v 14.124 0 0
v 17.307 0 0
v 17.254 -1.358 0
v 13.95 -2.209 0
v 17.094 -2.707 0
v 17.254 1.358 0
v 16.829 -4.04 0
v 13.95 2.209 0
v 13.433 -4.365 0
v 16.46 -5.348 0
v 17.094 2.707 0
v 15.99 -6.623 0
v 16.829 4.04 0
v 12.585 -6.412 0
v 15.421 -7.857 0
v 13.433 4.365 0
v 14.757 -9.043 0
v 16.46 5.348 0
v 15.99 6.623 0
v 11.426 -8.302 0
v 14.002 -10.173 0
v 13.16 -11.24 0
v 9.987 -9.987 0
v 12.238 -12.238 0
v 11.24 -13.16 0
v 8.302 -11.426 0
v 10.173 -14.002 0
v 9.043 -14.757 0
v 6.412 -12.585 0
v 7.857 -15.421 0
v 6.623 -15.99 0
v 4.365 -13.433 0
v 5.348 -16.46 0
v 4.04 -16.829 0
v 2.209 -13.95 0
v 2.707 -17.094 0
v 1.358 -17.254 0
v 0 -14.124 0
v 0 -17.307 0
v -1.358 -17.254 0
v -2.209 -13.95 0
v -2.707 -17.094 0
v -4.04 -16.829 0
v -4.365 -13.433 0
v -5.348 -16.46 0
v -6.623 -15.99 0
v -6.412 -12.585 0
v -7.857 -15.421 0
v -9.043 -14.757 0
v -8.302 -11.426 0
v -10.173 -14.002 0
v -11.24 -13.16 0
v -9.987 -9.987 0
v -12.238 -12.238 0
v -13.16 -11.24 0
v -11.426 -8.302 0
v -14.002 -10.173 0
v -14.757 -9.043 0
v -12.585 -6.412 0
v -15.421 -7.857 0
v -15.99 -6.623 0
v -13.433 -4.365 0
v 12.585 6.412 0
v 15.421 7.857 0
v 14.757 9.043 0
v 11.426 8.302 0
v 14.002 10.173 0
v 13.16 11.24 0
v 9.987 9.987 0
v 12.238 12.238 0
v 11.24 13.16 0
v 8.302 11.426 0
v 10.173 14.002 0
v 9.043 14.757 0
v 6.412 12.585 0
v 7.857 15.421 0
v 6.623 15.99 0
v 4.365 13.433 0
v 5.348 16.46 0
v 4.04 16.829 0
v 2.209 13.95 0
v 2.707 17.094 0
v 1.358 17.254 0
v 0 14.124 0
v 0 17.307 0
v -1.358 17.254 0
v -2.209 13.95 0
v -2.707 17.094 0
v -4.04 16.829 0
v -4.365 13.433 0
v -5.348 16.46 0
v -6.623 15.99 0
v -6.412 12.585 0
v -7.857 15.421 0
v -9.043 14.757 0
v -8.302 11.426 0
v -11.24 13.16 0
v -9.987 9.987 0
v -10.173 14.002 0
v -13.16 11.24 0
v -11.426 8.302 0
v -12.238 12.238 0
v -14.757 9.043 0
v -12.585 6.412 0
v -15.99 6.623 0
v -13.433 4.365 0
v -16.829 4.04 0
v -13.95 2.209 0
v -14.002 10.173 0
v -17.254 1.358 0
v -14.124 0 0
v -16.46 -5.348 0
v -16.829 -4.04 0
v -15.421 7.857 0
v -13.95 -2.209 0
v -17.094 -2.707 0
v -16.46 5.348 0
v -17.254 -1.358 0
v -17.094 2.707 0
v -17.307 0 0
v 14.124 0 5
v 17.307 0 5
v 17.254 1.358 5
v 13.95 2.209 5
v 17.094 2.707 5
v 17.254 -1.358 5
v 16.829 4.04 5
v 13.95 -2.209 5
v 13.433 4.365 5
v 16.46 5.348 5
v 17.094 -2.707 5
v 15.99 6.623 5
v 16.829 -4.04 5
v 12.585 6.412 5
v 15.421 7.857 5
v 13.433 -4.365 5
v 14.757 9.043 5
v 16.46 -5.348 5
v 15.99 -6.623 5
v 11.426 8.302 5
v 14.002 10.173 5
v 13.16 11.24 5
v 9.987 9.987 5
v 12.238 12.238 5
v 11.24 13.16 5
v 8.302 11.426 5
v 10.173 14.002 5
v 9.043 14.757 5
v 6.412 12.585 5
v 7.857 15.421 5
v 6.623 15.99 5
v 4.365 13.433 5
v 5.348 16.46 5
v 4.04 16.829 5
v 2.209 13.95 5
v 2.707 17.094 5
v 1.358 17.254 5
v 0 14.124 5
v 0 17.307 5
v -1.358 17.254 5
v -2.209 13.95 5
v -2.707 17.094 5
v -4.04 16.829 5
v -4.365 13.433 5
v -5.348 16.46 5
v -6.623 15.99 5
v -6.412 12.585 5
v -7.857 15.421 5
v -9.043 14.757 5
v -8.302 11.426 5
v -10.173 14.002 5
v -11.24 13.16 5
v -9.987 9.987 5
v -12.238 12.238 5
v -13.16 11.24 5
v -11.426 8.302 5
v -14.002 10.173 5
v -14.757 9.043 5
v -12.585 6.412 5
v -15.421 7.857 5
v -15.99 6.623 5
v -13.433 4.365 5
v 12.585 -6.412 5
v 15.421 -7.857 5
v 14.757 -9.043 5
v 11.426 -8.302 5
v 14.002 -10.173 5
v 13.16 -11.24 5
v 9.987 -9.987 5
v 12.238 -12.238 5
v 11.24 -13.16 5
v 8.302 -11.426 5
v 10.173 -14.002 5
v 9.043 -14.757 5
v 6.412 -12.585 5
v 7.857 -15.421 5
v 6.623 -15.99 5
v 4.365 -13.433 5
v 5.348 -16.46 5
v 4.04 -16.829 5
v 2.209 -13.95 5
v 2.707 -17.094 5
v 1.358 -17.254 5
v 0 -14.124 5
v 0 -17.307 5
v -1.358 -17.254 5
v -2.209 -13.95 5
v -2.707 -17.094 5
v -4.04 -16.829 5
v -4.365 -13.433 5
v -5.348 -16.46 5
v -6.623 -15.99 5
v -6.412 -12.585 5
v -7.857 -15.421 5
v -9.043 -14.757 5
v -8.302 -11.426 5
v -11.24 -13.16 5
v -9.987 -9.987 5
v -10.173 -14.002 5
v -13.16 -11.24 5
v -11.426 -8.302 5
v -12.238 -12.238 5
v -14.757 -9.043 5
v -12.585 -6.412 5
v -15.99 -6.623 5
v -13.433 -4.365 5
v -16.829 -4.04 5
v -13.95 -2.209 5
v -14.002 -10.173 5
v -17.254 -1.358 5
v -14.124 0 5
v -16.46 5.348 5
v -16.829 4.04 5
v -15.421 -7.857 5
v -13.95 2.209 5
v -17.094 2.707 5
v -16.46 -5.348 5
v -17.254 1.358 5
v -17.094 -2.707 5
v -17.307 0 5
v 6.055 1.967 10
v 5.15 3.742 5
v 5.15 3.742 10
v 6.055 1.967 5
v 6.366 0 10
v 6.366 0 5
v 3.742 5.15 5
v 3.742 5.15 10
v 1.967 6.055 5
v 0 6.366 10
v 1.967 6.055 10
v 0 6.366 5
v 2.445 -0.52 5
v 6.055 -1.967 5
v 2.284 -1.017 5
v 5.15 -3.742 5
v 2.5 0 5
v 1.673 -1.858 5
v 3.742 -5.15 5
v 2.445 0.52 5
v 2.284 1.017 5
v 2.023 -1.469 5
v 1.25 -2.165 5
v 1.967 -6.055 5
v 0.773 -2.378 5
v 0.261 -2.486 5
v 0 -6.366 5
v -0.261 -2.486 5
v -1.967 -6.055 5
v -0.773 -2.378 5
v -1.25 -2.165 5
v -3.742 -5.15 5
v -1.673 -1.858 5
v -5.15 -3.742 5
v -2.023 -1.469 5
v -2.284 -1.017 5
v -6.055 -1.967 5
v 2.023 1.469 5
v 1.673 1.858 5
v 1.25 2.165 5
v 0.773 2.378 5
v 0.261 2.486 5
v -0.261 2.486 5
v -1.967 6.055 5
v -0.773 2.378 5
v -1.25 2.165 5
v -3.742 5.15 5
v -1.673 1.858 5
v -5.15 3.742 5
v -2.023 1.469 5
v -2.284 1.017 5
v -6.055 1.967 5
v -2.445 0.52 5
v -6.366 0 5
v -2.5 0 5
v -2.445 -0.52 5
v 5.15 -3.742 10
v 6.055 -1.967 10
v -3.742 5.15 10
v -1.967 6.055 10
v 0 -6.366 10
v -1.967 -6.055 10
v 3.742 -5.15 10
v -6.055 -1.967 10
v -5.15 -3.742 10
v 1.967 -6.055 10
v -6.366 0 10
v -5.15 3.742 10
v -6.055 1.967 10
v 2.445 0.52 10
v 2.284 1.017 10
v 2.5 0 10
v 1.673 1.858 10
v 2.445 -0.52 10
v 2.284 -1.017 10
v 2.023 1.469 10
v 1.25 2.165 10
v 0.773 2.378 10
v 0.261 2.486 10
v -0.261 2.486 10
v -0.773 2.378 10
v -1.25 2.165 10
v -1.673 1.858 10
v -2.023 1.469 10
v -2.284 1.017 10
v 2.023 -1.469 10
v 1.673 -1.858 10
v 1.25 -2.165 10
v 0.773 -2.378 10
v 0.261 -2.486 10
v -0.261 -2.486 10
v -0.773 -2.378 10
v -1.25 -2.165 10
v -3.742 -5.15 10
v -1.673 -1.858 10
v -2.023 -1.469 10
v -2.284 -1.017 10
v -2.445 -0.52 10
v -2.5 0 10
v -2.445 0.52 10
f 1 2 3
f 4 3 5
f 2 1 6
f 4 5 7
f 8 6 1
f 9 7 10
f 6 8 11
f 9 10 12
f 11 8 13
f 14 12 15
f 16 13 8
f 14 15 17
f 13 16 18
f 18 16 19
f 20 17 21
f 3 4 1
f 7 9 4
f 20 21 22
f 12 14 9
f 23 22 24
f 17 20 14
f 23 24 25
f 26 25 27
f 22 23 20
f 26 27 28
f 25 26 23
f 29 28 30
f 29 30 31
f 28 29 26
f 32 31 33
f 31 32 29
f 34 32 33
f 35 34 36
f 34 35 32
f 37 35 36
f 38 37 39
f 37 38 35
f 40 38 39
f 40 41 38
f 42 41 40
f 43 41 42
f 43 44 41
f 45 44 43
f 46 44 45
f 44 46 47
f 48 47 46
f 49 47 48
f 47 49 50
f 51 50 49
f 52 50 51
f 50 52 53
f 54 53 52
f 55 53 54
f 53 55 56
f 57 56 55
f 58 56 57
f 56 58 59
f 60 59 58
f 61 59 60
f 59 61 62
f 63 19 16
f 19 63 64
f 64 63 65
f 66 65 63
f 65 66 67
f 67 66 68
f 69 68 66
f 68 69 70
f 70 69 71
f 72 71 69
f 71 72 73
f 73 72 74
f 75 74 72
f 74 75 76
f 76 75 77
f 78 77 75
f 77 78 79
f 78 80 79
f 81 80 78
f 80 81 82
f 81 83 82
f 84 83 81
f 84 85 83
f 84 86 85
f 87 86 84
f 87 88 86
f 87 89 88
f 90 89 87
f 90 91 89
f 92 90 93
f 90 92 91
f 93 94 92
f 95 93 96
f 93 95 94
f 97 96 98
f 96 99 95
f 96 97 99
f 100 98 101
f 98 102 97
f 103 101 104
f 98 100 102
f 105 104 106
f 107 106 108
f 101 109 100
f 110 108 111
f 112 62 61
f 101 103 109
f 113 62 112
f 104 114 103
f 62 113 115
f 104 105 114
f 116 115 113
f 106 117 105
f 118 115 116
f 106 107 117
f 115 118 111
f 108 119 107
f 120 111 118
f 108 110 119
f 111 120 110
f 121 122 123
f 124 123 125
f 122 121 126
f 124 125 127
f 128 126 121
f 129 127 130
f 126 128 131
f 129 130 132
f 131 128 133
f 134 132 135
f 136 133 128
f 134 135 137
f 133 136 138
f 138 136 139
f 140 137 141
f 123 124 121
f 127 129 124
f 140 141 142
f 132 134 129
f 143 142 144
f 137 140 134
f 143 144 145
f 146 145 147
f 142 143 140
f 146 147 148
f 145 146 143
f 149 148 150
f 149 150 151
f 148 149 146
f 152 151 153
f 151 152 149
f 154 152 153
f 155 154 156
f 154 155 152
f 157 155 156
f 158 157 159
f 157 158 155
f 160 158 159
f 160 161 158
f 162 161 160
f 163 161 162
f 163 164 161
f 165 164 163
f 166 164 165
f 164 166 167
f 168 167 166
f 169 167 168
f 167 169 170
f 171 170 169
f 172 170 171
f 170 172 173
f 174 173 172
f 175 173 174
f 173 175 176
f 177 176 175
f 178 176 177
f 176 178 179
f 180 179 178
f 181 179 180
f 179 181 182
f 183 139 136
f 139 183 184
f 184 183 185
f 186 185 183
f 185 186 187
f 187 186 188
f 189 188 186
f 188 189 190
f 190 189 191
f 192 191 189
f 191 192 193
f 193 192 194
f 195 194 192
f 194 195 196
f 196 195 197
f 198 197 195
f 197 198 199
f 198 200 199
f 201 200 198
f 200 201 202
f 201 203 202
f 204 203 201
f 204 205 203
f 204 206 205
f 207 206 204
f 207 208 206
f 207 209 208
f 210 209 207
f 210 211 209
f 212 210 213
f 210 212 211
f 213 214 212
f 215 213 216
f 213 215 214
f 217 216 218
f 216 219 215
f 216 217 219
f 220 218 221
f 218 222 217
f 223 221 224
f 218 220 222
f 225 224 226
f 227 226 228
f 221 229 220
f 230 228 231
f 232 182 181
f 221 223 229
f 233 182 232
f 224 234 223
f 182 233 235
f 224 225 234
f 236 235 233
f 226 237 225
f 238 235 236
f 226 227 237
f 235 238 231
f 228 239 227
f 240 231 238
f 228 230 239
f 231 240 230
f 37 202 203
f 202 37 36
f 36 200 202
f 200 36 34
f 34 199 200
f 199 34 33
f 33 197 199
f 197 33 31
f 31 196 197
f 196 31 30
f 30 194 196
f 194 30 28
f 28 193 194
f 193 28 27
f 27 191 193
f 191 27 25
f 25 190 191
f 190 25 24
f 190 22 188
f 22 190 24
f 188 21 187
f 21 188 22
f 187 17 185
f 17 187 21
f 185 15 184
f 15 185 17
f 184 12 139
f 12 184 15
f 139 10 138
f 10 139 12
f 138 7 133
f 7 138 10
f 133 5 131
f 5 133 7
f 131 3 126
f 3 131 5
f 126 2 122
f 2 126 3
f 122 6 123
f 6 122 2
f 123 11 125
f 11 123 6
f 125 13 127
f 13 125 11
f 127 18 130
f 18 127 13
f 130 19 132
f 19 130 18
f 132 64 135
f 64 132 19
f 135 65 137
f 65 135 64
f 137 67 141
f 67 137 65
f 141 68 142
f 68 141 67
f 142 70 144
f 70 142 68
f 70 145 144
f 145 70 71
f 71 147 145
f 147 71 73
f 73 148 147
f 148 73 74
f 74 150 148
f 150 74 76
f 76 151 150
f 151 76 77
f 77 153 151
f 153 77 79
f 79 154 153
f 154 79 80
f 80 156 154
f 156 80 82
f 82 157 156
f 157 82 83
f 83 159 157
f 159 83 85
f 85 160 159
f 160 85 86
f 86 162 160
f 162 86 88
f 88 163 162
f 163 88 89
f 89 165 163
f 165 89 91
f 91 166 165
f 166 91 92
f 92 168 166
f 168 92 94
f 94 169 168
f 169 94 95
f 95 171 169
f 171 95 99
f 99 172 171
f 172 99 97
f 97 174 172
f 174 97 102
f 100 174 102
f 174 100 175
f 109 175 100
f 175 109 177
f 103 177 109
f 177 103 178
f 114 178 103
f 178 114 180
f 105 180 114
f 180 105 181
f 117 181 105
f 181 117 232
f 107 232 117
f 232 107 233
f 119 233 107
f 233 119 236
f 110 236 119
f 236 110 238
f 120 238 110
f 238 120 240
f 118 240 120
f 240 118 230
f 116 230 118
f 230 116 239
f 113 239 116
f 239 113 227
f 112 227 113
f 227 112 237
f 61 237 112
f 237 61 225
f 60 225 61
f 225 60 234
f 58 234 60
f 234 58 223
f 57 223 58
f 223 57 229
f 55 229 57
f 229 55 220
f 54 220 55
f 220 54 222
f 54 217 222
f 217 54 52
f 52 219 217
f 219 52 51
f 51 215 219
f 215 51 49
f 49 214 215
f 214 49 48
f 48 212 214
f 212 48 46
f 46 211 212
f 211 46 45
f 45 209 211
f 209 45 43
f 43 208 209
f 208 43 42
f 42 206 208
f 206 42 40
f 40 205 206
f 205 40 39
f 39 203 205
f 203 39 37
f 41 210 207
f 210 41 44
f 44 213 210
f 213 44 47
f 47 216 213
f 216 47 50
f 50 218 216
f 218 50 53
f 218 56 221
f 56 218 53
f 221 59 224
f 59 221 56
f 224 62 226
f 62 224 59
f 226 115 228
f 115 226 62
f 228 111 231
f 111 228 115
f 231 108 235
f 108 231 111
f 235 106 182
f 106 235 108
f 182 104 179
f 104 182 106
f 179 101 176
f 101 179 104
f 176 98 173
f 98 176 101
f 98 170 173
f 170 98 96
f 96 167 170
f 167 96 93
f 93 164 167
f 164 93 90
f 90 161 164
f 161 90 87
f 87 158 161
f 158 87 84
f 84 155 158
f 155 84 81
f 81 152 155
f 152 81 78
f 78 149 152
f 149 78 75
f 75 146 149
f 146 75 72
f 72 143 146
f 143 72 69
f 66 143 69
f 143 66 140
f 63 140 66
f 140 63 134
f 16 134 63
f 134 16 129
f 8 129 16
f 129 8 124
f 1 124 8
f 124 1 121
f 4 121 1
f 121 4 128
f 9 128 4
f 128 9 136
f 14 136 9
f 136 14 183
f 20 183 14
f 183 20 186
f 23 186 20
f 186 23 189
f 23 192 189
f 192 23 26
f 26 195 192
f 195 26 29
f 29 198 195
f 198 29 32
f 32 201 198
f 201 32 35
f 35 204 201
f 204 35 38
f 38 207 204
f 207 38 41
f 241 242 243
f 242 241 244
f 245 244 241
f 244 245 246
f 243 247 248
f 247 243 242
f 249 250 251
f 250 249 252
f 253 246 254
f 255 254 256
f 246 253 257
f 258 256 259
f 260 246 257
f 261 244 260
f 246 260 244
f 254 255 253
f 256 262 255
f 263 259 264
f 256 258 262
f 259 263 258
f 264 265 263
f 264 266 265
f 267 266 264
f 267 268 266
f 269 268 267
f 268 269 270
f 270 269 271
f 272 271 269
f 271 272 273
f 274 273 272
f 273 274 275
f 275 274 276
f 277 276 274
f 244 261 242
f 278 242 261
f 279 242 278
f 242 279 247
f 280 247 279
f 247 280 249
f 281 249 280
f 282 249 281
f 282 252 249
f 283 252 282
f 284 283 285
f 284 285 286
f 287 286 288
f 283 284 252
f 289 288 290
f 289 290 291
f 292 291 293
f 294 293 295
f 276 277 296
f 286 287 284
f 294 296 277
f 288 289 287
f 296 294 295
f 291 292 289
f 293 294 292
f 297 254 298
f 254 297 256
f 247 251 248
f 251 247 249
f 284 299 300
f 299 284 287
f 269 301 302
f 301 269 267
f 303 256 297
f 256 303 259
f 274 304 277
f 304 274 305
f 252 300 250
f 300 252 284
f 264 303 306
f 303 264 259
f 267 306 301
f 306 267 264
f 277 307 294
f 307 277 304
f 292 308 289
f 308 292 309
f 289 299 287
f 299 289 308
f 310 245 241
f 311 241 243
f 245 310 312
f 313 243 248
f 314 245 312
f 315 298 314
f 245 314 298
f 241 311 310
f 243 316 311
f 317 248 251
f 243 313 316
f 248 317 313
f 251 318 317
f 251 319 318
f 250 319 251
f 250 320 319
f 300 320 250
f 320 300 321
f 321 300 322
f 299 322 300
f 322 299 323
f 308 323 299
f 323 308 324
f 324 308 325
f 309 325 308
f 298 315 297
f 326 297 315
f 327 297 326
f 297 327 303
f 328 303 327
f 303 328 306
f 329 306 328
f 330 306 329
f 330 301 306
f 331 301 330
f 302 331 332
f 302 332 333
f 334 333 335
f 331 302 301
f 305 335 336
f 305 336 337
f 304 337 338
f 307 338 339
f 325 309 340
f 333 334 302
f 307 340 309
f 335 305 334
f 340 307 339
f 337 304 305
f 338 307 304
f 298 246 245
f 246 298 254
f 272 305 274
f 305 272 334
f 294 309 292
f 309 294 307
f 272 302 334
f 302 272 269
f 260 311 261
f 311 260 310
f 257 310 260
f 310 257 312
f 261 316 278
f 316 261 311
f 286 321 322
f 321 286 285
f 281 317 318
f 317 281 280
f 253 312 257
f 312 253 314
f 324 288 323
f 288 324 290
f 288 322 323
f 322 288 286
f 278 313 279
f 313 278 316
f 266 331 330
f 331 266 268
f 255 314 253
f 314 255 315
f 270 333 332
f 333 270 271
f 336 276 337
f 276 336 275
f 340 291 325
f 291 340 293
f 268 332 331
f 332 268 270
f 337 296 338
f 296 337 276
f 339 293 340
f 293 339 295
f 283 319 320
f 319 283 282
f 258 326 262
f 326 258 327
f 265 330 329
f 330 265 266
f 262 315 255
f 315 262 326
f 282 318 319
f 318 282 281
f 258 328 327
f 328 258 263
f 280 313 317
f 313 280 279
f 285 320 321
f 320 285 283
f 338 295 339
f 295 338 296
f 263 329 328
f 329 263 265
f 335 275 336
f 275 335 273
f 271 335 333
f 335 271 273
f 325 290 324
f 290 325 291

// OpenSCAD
// Parametric Gear
// Based on public domain gear script

/* [Gear Properties] */
number_of_teeth = 20;
circular_pitch = 5;
pressure_angle = 20;
clearance = 0.2;

/* [Dimensions] */
gear_thickness = 5;
rim_thickness = 5;
hub_thickness = 10;
bore = 5;

// Calculated values
pitch_radius = number_of_teeth * circular_pitch / (2 * PI);

// Gear module
module gear() {
    difference() {
        union() {
            // Gear teeth
            linear_extrude(height=gear_thickness)
                gear_2d(
                    number_of_teeth=number_of_teeth,
                    circular_pitch=circular_pitch,
                    pressure_angle=pressure_angle,
                    clearance=clearance
                );

            // Rim
            if (rim_thickness > gear_thickness) {
                translate([0, 0, gear_thickness])
                    cylinder(
                        h=rim_thickness-gear_thickness,
                        r=pitch_radius * 0.8,
                        $fn=number_of_teeth*2
                    );
            }

            // Hub
            if (hub_thickness > rim_thickness) {
                translate([0, 0, rim_thickness])
                    cylinder(
                        h=hub_thickness-rim_thickness,
                        r=pitch_radius * 0.4,
                        $fn=number_of_teeth
                    );
            }
        }

        // Center bore
        if (bore > 0) {
            translate([0, 0, -0.5])
                cylinder(h=hub_thickness+1, r=bore/2, $fn=30);
        }
    }
}

module gear_2d(
    number_of_teeth,
    circular_pitch,
    pressure_angle,
    clearance
) {
    pitch_radius = number_of_teeth * circular_pitch / (2 * PI);
    base_radius = pitch_radius * cos(pressure_angle);
    outer_radius = pitch_radius + circular_pitch / PI - clearance;
    root_radius = pitch_radius - circular_pitch / PI - clearance;

    // Generate gear profile
    difference() {
        union() {
            // Outer circle
            circle(r=outer_radius, $fn=number_of_teeth*4);

            // Teeth
            for (i = [0:number_of_teeth-1]) {
                rotate([0, 0, i*360/number_of_teeth])
                    gear_tooth(
                        base_radius=base_radius,
                        outer_radius=outer_radius,
                        half_tooth_angle=180/number_of_teeth
                    );
            }
        }

        // Remove center for root
        circle(r=root_radius, $fn=number_of_teeth*2);
    }
}

module gear_tooth(base_radius, outer_radius, half_tooth_angle) {
    angle_step = 0.5;
    points = [
        for (t = [0:angle_step:half_tooth_angle])
            let(
                r = base_radius + (outer_radius - base_radius) * (t / half_tooth_angle),
                a = t
            )
            [r * cos(a), r * sin(a)]
    ];

    mirror_points = [
        for (i = [len(points)-1:-1:0])
            [points[i][0], -points[i][1]]
    ];

    polygon(concat(points, mirror_points));
}

// Render the gear
gear();
